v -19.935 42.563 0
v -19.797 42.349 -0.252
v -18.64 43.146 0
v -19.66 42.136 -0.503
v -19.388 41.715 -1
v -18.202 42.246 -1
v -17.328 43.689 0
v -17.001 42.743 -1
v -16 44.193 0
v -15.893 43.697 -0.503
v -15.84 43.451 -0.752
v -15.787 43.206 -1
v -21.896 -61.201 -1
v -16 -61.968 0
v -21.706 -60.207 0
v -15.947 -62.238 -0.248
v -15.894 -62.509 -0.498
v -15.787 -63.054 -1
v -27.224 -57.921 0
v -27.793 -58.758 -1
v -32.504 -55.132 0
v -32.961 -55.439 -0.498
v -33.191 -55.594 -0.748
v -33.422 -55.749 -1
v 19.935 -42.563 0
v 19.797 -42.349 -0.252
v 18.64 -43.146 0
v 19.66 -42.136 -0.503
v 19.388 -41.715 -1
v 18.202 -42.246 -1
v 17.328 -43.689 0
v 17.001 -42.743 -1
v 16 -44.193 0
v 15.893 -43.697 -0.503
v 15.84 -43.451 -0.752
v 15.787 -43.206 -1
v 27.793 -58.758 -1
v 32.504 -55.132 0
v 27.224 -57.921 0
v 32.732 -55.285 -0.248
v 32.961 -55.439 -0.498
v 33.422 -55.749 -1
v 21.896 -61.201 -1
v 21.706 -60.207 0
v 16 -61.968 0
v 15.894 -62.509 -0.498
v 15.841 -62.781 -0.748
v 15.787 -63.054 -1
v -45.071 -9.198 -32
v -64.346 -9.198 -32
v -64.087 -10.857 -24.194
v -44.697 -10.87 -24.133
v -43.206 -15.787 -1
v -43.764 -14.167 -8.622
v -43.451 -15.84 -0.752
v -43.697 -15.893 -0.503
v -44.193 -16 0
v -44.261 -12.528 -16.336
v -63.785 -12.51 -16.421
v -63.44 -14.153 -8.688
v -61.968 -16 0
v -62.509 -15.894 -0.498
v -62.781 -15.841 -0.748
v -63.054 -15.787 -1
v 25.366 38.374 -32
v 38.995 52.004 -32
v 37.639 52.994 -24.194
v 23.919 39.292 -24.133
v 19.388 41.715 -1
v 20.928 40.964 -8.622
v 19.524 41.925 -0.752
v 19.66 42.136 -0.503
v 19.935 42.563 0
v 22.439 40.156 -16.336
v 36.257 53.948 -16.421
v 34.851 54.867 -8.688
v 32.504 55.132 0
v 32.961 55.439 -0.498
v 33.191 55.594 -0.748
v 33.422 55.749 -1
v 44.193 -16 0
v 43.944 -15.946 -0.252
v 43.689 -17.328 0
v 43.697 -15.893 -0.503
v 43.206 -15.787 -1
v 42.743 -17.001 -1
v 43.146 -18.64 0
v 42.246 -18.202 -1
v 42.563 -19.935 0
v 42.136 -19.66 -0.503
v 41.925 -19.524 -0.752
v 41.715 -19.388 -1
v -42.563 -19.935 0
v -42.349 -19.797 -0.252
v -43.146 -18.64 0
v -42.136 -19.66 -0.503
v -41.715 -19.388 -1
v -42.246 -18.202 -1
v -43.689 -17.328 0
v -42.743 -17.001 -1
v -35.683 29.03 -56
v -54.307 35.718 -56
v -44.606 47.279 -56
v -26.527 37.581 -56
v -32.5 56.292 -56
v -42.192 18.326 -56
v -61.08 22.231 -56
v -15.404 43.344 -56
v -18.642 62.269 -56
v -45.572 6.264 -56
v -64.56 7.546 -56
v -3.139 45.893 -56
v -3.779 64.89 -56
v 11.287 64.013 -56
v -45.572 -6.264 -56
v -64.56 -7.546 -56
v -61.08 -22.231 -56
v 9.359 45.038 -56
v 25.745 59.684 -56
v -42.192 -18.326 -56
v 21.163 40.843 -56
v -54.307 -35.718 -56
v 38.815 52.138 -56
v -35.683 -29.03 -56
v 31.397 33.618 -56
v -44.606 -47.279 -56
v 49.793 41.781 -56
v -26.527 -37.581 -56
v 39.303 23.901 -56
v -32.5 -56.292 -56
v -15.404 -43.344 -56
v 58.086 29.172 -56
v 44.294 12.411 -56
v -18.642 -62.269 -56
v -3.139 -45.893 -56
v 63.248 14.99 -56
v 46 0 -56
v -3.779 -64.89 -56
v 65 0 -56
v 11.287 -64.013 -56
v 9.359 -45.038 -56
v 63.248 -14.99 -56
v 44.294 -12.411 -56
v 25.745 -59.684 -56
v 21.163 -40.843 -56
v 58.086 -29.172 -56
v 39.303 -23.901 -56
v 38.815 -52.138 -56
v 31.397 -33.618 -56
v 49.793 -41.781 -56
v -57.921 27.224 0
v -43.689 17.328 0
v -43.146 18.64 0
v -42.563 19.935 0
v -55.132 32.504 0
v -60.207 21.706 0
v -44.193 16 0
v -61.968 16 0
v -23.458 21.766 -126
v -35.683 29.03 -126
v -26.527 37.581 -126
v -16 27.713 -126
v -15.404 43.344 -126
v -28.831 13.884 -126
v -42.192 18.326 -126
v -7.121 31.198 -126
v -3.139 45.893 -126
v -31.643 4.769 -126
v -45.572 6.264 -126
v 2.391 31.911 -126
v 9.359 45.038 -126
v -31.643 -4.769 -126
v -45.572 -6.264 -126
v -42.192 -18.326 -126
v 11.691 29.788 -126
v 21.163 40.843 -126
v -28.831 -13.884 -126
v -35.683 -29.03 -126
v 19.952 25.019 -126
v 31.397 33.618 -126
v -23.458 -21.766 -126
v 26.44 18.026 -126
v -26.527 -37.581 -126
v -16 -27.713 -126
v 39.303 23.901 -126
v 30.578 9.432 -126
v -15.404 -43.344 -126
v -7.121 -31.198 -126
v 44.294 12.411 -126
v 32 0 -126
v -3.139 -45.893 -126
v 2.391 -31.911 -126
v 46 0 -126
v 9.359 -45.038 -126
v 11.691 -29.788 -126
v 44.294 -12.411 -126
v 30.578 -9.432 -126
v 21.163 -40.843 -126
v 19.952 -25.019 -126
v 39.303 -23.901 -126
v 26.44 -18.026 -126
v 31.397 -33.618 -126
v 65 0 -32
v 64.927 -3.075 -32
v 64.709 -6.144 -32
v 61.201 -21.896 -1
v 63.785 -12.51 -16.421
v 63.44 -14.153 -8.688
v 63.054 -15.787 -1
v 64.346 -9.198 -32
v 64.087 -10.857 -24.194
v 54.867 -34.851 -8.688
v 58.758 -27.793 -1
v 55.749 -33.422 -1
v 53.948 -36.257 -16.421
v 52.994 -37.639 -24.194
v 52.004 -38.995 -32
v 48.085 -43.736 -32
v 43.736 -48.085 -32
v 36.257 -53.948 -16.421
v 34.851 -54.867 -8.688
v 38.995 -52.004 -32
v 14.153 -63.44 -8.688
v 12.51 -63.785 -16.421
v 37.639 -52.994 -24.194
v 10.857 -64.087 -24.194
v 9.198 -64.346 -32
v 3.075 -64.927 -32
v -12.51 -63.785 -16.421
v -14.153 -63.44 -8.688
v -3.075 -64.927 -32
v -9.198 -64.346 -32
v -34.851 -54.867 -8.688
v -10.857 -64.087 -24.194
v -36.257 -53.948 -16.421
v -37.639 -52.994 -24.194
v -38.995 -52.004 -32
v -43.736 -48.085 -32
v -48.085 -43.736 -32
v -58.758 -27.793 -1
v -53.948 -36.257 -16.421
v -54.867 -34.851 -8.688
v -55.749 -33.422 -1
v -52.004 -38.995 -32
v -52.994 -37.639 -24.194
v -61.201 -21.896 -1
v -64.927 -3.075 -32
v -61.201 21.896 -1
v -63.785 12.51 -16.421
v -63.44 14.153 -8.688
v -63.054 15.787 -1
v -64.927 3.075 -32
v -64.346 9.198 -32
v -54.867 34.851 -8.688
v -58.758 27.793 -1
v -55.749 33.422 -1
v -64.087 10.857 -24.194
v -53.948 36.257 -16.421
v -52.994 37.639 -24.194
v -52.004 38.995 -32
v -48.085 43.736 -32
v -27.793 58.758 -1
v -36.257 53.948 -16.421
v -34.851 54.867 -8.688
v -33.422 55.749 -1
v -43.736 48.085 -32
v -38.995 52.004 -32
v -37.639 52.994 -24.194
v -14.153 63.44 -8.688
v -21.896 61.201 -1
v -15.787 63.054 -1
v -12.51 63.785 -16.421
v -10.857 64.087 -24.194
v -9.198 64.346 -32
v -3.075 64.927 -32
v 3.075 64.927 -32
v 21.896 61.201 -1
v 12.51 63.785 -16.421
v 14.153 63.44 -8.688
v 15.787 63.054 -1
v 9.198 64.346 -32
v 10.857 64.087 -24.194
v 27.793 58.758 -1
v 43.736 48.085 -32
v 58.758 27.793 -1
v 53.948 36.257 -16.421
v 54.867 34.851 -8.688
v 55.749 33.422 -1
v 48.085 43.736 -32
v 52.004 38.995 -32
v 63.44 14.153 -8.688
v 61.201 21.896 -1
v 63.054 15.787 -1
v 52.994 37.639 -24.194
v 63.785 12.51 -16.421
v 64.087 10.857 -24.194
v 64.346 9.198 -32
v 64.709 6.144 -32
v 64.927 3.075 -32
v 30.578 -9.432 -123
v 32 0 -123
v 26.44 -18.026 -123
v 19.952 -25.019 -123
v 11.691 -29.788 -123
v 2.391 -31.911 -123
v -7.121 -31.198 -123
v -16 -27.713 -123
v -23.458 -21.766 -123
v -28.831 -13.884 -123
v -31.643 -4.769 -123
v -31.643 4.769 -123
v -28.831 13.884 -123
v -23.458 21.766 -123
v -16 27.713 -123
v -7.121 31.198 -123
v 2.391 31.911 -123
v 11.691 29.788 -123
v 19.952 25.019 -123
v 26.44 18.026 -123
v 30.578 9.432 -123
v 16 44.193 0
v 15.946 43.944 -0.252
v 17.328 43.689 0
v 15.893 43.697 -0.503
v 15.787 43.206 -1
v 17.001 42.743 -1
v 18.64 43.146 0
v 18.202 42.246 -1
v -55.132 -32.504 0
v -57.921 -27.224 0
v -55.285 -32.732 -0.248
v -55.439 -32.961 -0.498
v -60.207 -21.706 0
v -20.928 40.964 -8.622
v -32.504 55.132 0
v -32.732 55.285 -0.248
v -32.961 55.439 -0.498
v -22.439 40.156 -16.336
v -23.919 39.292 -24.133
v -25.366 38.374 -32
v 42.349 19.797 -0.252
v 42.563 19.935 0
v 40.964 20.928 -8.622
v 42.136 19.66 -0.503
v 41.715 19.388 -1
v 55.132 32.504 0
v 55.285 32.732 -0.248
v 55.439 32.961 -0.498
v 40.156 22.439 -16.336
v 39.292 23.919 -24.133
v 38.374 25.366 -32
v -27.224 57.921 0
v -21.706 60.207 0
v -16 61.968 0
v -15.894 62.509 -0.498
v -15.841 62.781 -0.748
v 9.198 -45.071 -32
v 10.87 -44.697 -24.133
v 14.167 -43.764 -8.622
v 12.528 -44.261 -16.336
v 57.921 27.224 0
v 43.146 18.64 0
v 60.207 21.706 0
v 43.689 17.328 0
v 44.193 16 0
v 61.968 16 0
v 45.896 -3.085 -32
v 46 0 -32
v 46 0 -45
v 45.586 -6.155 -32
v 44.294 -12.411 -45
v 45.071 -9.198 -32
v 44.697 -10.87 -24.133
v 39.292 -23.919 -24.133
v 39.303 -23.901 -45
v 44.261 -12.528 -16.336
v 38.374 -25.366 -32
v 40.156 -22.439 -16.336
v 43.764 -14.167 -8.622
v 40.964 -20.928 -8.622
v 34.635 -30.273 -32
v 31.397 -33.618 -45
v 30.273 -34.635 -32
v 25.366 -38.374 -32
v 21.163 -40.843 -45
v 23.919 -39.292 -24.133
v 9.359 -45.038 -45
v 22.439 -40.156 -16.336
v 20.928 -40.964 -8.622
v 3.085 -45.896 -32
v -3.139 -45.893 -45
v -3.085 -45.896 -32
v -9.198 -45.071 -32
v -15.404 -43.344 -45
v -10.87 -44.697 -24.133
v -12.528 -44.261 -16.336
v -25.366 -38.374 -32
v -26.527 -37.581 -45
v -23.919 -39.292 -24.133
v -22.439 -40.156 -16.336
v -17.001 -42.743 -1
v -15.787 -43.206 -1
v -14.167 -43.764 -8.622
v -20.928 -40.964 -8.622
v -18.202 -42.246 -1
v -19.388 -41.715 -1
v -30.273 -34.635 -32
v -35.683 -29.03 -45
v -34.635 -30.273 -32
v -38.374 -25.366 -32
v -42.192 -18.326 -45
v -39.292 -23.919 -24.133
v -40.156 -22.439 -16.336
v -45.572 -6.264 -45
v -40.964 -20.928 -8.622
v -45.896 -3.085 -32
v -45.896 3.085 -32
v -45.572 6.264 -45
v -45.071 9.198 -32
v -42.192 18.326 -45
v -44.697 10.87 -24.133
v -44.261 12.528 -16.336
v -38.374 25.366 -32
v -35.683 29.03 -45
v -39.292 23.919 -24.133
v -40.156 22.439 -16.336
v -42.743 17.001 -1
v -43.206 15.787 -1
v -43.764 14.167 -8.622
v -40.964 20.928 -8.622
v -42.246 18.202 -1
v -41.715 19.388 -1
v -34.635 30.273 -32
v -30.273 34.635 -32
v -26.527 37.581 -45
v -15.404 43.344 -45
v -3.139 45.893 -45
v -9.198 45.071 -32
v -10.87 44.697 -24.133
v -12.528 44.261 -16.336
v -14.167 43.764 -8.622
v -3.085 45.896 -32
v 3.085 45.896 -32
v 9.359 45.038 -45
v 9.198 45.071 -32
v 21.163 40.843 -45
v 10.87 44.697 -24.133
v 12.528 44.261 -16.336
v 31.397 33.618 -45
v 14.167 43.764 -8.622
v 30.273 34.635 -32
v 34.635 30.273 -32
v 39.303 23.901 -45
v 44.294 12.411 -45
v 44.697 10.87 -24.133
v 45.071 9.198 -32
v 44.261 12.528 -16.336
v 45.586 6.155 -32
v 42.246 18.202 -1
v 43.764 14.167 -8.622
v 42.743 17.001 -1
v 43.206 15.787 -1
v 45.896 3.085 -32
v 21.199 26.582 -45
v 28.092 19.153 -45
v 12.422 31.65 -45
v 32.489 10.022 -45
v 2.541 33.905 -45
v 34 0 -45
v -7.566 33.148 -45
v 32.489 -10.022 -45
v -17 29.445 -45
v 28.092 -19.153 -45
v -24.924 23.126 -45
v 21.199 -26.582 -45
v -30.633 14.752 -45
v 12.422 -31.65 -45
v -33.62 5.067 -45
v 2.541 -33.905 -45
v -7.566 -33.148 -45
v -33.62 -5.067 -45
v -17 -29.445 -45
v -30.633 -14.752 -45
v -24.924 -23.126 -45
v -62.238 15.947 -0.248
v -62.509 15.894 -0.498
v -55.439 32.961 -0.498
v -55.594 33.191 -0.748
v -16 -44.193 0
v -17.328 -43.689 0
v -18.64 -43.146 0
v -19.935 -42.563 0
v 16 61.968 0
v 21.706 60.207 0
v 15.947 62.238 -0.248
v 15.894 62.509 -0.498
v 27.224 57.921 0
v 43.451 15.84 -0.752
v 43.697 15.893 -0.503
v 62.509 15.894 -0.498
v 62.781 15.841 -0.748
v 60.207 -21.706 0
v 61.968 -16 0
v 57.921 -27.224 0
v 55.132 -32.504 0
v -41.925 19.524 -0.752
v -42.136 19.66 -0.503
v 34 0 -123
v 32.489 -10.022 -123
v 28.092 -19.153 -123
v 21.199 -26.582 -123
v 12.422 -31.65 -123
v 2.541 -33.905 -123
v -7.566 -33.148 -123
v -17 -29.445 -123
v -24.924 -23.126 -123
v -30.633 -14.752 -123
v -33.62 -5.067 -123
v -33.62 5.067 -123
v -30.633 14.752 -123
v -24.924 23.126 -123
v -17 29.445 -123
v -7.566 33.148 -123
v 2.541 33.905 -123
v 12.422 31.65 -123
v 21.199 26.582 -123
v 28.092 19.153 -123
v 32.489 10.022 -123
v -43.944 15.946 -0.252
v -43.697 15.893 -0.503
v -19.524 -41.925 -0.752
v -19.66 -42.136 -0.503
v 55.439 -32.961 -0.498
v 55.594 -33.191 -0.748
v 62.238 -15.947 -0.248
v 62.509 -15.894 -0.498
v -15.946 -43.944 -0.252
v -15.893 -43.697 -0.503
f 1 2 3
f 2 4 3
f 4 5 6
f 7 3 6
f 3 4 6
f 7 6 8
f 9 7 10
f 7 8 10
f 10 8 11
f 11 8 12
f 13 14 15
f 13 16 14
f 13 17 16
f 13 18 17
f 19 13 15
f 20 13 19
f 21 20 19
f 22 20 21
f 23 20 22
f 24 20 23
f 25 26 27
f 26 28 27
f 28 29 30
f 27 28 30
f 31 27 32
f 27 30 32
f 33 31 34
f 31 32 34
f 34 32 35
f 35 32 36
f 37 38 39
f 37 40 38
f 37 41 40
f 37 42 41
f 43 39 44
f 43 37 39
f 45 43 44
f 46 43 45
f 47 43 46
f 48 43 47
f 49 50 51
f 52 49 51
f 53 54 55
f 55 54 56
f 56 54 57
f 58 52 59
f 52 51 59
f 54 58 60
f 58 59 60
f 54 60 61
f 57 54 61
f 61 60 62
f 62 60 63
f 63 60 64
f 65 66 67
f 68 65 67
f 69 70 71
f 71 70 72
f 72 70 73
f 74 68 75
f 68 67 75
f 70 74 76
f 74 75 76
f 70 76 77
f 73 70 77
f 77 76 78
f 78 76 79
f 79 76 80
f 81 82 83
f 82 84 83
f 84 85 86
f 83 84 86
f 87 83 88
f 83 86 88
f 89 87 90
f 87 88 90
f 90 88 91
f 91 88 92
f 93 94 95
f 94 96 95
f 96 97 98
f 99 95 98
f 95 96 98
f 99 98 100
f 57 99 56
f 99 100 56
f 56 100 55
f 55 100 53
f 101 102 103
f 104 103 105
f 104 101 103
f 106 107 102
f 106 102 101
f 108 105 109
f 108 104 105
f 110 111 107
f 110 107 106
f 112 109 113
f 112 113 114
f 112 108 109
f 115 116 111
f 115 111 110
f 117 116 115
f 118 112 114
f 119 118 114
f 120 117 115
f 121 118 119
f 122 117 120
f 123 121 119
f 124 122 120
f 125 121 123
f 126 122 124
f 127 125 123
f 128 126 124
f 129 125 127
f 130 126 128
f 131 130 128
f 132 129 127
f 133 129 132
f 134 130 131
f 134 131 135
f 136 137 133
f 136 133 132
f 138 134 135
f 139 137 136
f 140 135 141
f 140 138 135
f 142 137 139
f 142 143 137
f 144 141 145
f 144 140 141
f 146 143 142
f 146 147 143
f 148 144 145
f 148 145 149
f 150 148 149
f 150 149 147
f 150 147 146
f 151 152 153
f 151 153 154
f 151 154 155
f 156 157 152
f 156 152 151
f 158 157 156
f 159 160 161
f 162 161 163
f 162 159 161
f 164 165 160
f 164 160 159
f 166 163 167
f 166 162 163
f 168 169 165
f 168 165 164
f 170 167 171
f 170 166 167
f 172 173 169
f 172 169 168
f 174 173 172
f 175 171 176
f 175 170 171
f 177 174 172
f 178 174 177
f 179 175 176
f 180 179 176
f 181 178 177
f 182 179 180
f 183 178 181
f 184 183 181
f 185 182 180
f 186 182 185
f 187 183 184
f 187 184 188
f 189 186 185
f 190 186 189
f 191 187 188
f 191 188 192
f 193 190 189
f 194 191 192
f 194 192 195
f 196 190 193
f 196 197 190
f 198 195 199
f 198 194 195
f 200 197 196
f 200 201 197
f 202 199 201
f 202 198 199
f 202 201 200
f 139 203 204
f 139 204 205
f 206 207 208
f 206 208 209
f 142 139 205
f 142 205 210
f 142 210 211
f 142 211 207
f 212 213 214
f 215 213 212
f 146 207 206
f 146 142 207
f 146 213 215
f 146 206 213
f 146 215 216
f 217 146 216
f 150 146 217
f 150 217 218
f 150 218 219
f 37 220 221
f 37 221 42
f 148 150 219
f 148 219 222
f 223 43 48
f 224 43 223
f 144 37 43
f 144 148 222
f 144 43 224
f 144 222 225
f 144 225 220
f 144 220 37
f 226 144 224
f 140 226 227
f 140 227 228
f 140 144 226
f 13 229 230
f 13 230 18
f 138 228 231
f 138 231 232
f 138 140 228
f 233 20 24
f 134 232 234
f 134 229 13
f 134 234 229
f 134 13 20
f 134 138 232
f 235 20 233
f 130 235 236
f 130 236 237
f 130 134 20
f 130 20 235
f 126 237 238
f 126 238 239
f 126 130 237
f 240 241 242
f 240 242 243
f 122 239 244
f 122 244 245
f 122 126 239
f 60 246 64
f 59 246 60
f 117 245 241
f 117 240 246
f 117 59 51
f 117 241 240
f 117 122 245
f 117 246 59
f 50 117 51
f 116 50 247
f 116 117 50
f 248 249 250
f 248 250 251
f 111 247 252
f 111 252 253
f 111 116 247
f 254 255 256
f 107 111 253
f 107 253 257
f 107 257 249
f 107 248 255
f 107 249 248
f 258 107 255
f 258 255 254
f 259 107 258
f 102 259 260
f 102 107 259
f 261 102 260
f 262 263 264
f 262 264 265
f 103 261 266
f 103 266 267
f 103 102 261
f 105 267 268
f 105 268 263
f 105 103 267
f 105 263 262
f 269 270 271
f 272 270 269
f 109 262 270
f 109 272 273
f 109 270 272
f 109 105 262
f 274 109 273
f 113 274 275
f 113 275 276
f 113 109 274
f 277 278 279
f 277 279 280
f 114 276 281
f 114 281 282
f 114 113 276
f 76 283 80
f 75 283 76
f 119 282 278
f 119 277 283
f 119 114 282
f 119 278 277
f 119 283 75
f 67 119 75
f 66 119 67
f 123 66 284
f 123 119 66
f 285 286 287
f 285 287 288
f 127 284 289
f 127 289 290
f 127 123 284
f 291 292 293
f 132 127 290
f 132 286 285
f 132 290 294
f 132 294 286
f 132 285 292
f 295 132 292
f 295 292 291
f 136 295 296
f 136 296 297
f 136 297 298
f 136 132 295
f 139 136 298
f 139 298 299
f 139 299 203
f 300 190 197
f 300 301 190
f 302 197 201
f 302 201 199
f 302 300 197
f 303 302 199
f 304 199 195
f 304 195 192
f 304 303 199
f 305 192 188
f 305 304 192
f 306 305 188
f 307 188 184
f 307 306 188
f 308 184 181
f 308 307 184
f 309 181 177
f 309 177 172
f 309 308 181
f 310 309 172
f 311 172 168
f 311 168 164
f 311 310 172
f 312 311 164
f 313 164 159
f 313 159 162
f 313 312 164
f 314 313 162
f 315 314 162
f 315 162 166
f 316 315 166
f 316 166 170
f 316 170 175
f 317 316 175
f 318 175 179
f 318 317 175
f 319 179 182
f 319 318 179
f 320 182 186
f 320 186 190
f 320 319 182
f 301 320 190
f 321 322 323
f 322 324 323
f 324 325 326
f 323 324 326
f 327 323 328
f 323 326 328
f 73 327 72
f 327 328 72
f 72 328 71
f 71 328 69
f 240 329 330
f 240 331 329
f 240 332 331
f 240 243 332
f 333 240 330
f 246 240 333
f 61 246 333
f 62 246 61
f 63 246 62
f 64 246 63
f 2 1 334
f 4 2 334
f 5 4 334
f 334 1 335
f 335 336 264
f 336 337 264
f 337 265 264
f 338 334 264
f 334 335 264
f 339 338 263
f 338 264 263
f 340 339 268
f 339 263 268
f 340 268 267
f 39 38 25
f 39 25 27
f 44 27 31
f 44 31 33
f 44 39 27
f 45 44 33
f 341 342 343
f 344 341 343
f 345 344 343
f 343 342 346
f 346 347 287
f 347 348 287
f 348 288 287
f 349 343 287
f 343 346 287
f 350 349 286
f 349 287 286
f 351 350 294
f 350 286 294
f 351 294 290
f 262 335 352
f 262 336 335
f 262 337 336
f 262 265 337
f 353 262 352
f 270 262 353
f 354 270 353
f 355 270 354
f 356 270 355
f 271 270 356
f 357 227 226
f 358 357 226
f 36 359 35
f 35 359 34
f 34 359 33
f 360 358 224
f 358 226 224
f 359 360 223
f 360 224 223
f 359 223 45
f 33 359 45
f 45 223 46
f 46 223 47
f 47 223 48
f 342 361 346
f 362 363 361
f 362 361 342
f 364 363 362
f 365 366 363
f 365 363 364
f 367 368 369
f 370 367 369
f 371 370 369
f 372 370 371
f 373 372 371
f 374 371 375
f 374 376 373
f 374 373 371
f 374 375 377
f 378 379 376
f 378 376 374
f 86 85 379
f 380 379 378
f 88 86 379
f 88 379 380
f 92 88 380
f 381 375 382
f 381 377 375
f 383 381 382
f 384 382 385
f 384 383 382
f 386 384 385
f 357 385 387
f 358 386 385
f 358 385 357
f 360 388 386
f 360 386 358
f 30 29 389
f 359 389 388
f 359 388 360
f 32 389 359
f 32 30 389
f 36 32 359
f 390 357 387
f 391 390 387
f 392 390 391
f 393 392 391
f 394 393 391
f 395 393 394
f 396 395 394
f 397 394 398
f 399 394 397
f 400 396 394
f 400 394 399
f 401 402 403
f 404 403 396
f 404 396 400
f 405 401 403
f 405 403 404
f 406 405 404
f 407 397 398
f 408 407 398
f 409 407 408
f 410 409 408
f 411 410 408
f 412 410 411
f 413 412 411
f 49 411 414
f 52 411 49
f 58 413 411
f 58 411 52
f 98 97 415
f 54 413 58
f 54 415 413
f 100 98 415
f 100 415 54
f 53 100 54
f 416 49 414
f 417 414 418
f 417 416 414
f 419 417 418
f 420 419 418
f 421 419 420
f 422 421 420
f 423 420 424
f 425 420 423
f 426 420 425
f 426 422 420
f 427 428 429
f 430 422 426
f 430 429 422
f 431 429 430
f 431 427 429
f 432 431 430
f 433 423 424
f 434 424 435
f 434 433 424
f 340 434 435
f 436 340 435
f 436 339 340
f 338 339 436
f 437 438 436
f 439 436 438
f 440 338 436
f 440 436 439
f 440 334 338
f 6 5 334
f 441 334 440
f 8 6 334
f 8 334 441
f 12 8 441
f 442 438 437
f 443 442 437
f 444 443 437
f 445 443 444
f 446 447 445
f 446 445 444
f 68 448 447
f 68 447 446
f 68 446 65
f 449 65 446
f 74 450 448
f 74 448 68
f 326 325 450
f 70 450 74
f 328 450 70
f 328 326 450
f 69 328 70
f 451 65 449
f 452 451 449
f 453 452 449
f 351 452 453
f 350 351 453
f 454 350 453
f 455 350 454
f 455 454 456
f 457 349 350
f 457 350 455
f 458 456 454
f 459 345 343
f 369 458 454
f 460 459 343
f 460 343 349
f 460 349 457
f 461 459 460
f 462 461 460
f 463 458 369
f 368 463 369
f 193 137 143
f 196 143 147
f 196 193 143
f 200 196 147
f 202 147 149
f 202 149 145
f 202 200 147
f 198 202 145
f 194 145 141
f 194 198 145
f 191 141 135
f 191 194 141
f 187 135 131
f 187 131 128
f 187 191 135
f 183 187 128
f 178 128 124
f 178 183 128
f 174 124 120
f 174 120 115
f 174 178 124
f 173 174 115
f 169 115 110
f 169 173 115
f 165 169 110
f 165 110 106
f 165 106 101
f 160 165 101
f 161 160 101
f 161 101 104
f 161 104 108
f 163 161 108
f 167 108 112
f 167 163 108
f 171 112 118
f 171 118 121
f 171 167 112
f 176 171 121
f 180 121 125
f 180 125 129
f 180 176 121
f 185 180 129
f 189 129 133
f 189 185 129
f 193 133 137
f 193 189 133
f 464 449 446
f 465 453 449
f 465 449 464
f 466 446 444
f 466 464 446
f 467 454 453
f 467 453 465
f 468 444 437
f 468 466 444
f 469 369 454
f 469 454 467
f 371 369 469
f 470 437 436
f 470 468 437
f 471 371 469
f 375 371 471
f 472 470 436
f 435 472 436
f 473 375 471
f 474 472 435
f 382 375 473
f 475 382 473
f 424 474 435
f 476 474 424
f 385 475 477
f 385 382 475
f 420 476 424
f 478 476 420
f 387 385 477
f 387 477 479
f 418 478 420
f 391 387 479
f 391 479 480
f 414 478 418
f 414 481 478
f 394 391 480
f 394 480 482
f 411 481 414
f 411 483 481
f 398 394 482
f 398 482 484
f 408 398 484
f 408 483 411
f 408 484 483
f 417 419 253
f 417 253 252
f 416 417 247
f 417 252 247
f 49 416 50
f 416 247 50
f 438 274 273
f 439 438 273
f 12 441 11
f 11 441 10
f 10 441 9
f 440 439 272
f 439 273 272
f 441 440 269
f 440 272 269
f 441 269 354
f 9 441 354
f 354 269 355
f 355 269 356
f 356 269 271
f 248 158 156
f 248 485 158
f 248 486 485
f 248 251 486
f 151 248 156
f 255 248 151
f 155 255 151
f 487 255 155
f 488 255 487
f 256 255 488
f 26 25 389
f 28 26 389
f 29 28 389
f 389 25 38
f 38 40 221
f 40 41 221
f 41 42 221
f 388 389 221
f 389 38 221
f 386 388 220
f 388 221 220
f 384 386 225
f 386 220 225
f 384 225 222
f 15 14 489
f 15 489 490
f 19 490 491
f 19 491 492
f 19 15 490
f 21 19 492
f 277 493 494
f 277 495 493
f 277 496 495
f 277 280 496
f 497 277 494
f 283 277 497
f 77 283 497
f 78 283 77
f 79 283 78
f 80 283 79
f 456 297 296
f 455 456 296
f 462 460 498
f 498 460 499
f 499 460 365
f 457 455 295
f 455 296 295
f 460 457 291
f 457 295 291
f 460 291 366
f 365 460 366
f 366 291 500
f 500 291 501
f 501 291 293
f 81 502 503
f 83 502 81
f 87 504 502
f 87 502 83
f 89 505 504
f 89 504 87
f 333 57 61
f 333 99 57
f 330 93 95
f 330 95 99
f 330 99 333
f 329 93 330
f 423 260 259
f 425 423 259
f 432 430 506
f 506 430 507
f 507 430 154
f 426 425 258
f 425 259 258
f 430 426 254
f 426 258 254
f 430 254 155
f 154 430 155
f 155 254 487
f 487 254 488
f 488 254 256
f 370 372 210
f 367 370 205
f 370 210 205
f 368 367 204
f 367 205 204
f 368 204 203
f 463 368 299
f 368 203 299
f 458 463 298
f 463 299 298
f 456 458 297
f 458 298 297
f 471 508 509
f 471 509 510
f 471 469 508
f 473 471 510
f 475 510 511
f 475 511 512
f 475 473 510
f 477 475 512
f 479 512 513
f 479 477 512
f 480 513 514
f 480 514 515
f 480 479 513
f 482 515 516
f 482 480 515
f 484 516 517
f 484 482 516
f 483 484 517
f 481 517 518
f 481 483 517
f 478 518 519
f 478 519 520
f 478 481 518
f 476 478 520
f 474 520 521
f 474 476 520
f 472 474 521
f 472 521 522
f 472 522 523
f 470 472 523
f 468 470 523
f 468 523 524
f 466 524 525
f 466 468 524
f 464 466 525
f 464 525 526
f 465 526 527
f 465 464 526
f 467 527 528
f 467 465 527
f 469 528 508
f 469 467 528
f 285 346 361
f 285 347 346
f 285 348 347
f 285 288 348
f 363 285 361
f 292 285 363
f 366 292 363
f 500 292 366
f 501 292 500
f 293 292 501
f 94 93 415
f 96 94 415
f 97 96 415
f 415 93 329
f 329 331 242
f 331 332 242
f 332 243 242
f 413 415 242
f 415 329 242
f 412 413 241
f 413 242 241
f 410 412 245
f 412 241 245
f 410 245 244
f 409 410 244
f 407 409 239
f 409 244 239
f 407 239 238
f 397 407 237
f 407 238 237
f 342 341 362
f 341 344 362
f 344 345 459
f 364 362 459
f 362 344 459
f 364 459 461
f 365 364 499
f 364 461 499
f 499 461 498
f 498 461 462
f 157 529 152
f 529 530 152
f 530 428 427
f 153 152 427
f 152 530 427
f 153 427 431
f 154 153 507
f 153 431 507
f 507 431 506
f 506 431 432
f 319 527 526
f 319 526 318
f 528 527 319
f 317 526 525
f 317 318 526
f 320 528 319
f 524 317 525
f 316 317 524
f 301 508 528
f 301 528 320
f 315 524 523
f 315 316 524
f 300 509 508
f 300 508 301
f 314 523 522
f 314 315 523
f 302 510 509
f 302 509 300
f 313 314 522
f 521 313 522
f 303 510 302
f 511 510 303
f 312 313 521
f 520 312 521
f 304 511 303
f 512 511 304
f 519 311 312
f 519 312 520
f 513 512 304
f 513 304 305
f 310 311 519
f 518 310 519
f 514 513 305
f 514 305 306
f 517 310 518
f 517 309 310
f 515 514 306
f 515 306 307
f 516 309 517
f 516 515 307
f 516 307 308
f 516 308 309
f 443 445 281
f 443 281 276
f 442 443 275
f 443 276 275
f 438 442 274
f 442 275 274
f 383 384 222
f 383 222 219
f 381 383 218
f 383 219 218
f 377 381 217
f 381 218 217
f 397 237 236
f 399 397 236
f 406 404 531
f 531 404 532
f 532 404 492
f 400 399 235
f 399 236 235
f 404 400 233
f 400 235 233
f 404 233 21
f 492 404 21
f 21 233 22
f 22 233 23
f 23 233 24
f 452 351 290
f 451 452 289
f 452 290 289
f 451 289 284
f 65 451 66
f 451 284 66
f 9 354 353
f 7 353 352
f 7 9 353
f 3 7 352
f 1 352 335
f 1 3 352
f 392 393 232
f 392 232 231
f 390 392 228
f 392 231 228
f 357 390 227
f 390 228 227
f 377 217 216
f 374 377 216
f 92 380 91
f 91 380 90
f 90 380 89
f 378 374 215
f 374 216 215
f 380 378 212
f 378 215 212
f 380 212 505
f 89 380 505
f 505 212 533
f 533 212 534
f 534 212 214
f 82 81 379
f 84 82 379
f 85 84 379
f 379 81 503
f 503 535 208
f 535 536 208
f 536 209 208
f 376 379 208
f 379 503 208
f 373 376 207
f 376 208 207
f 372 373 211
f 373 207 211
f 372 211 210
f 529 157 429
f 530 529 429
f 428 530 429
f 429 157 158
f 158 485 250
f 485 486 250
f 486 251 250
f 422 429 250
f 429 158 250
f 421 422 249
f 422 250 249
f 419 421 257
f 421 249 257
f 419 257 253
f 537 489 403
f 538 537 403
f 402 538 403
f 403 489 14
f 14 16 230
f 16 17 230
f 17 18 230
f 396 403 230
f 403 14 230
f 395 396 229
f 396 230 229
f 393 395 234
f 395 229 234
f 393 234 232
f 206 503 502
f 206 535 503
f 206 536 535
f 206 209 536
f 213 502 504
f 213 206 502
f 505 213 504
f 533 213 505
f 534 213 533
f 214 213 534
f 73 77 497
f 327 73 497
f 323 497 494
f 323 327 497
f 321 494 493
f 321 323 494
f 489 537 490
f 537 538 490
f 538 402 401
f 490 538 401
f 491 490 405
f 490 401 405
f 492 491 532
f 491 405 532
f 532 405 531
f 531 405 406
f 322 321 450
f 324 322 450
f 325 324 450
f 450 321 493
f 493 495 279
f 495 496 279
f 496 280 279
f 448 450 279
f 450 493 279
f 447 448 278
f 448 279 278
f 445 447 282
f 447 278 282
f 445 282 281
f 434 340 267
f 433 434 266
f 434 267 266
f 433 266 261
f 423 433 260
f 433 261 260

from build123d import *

# Parameters (mm, degrees)
CHAMFER_1_SIZE           = 1
CUT_EXTRUDE_1_DEPTH      = 65
PATTERN_CIRCULAR_1_COUNT = 8


with BuildPart() as part:
    # Эскиз1 → Повернуть1 (revolve)
    with BuildSketch(Plane(origin=(0, 0, 0), x_dir=(0, 0, -1), z_dir=(1, 0, 0))):
        Polygon((0, 46), (0, 65), (56, 65), (56, 46), (126, 46), (126, 32), (123, 32), (123, 34), (45, 34), (45, 46), align=None)
    revolve(axis=Axis((0, 0, 0), (0, 0, -1)))

    # Фаска1
    chamfer_1_edges = [part.edges().sort_by_distance(p)[0] for p in [
        (0, -65, 0),
        (0, -46, 0),
    ]]
    chamfer(chamfer_1_edges, length=CHAMFER_1_SIZE)

    # Эскиз2 → Вырез-Вытянуть1 (cut)
    with BuildSketch(Plane(origin=(0, 65, -28), x_dir=(-1, 0, 0), z_dir=(0, 1, 0))):
        Polygon((16, 28), (-16, 28), (-9.198190027, -4), (9.198190027, -4), align=None)
    cut_extrude_1 = extrude(amount=-CUT_EXTRUDE_1_DEPTH, mode=Mode.SUBTRACT)

    # Круговой массив1: Вырез-Вытянуть1 ×8 about axis
    pattern_circular_1_axis = Axis((0, 0, -45), (0, 0, 1))
    for i in range(1, PATTERN_CIRCULAR_1_COUNT):
        add(cut_extrude_1.rotate(pattern_circular_1_axis, i * 360 / PATTERN_CIRCULAR_1_COUNT), mode=Mode.SUBTRACT)


solid = part.part
